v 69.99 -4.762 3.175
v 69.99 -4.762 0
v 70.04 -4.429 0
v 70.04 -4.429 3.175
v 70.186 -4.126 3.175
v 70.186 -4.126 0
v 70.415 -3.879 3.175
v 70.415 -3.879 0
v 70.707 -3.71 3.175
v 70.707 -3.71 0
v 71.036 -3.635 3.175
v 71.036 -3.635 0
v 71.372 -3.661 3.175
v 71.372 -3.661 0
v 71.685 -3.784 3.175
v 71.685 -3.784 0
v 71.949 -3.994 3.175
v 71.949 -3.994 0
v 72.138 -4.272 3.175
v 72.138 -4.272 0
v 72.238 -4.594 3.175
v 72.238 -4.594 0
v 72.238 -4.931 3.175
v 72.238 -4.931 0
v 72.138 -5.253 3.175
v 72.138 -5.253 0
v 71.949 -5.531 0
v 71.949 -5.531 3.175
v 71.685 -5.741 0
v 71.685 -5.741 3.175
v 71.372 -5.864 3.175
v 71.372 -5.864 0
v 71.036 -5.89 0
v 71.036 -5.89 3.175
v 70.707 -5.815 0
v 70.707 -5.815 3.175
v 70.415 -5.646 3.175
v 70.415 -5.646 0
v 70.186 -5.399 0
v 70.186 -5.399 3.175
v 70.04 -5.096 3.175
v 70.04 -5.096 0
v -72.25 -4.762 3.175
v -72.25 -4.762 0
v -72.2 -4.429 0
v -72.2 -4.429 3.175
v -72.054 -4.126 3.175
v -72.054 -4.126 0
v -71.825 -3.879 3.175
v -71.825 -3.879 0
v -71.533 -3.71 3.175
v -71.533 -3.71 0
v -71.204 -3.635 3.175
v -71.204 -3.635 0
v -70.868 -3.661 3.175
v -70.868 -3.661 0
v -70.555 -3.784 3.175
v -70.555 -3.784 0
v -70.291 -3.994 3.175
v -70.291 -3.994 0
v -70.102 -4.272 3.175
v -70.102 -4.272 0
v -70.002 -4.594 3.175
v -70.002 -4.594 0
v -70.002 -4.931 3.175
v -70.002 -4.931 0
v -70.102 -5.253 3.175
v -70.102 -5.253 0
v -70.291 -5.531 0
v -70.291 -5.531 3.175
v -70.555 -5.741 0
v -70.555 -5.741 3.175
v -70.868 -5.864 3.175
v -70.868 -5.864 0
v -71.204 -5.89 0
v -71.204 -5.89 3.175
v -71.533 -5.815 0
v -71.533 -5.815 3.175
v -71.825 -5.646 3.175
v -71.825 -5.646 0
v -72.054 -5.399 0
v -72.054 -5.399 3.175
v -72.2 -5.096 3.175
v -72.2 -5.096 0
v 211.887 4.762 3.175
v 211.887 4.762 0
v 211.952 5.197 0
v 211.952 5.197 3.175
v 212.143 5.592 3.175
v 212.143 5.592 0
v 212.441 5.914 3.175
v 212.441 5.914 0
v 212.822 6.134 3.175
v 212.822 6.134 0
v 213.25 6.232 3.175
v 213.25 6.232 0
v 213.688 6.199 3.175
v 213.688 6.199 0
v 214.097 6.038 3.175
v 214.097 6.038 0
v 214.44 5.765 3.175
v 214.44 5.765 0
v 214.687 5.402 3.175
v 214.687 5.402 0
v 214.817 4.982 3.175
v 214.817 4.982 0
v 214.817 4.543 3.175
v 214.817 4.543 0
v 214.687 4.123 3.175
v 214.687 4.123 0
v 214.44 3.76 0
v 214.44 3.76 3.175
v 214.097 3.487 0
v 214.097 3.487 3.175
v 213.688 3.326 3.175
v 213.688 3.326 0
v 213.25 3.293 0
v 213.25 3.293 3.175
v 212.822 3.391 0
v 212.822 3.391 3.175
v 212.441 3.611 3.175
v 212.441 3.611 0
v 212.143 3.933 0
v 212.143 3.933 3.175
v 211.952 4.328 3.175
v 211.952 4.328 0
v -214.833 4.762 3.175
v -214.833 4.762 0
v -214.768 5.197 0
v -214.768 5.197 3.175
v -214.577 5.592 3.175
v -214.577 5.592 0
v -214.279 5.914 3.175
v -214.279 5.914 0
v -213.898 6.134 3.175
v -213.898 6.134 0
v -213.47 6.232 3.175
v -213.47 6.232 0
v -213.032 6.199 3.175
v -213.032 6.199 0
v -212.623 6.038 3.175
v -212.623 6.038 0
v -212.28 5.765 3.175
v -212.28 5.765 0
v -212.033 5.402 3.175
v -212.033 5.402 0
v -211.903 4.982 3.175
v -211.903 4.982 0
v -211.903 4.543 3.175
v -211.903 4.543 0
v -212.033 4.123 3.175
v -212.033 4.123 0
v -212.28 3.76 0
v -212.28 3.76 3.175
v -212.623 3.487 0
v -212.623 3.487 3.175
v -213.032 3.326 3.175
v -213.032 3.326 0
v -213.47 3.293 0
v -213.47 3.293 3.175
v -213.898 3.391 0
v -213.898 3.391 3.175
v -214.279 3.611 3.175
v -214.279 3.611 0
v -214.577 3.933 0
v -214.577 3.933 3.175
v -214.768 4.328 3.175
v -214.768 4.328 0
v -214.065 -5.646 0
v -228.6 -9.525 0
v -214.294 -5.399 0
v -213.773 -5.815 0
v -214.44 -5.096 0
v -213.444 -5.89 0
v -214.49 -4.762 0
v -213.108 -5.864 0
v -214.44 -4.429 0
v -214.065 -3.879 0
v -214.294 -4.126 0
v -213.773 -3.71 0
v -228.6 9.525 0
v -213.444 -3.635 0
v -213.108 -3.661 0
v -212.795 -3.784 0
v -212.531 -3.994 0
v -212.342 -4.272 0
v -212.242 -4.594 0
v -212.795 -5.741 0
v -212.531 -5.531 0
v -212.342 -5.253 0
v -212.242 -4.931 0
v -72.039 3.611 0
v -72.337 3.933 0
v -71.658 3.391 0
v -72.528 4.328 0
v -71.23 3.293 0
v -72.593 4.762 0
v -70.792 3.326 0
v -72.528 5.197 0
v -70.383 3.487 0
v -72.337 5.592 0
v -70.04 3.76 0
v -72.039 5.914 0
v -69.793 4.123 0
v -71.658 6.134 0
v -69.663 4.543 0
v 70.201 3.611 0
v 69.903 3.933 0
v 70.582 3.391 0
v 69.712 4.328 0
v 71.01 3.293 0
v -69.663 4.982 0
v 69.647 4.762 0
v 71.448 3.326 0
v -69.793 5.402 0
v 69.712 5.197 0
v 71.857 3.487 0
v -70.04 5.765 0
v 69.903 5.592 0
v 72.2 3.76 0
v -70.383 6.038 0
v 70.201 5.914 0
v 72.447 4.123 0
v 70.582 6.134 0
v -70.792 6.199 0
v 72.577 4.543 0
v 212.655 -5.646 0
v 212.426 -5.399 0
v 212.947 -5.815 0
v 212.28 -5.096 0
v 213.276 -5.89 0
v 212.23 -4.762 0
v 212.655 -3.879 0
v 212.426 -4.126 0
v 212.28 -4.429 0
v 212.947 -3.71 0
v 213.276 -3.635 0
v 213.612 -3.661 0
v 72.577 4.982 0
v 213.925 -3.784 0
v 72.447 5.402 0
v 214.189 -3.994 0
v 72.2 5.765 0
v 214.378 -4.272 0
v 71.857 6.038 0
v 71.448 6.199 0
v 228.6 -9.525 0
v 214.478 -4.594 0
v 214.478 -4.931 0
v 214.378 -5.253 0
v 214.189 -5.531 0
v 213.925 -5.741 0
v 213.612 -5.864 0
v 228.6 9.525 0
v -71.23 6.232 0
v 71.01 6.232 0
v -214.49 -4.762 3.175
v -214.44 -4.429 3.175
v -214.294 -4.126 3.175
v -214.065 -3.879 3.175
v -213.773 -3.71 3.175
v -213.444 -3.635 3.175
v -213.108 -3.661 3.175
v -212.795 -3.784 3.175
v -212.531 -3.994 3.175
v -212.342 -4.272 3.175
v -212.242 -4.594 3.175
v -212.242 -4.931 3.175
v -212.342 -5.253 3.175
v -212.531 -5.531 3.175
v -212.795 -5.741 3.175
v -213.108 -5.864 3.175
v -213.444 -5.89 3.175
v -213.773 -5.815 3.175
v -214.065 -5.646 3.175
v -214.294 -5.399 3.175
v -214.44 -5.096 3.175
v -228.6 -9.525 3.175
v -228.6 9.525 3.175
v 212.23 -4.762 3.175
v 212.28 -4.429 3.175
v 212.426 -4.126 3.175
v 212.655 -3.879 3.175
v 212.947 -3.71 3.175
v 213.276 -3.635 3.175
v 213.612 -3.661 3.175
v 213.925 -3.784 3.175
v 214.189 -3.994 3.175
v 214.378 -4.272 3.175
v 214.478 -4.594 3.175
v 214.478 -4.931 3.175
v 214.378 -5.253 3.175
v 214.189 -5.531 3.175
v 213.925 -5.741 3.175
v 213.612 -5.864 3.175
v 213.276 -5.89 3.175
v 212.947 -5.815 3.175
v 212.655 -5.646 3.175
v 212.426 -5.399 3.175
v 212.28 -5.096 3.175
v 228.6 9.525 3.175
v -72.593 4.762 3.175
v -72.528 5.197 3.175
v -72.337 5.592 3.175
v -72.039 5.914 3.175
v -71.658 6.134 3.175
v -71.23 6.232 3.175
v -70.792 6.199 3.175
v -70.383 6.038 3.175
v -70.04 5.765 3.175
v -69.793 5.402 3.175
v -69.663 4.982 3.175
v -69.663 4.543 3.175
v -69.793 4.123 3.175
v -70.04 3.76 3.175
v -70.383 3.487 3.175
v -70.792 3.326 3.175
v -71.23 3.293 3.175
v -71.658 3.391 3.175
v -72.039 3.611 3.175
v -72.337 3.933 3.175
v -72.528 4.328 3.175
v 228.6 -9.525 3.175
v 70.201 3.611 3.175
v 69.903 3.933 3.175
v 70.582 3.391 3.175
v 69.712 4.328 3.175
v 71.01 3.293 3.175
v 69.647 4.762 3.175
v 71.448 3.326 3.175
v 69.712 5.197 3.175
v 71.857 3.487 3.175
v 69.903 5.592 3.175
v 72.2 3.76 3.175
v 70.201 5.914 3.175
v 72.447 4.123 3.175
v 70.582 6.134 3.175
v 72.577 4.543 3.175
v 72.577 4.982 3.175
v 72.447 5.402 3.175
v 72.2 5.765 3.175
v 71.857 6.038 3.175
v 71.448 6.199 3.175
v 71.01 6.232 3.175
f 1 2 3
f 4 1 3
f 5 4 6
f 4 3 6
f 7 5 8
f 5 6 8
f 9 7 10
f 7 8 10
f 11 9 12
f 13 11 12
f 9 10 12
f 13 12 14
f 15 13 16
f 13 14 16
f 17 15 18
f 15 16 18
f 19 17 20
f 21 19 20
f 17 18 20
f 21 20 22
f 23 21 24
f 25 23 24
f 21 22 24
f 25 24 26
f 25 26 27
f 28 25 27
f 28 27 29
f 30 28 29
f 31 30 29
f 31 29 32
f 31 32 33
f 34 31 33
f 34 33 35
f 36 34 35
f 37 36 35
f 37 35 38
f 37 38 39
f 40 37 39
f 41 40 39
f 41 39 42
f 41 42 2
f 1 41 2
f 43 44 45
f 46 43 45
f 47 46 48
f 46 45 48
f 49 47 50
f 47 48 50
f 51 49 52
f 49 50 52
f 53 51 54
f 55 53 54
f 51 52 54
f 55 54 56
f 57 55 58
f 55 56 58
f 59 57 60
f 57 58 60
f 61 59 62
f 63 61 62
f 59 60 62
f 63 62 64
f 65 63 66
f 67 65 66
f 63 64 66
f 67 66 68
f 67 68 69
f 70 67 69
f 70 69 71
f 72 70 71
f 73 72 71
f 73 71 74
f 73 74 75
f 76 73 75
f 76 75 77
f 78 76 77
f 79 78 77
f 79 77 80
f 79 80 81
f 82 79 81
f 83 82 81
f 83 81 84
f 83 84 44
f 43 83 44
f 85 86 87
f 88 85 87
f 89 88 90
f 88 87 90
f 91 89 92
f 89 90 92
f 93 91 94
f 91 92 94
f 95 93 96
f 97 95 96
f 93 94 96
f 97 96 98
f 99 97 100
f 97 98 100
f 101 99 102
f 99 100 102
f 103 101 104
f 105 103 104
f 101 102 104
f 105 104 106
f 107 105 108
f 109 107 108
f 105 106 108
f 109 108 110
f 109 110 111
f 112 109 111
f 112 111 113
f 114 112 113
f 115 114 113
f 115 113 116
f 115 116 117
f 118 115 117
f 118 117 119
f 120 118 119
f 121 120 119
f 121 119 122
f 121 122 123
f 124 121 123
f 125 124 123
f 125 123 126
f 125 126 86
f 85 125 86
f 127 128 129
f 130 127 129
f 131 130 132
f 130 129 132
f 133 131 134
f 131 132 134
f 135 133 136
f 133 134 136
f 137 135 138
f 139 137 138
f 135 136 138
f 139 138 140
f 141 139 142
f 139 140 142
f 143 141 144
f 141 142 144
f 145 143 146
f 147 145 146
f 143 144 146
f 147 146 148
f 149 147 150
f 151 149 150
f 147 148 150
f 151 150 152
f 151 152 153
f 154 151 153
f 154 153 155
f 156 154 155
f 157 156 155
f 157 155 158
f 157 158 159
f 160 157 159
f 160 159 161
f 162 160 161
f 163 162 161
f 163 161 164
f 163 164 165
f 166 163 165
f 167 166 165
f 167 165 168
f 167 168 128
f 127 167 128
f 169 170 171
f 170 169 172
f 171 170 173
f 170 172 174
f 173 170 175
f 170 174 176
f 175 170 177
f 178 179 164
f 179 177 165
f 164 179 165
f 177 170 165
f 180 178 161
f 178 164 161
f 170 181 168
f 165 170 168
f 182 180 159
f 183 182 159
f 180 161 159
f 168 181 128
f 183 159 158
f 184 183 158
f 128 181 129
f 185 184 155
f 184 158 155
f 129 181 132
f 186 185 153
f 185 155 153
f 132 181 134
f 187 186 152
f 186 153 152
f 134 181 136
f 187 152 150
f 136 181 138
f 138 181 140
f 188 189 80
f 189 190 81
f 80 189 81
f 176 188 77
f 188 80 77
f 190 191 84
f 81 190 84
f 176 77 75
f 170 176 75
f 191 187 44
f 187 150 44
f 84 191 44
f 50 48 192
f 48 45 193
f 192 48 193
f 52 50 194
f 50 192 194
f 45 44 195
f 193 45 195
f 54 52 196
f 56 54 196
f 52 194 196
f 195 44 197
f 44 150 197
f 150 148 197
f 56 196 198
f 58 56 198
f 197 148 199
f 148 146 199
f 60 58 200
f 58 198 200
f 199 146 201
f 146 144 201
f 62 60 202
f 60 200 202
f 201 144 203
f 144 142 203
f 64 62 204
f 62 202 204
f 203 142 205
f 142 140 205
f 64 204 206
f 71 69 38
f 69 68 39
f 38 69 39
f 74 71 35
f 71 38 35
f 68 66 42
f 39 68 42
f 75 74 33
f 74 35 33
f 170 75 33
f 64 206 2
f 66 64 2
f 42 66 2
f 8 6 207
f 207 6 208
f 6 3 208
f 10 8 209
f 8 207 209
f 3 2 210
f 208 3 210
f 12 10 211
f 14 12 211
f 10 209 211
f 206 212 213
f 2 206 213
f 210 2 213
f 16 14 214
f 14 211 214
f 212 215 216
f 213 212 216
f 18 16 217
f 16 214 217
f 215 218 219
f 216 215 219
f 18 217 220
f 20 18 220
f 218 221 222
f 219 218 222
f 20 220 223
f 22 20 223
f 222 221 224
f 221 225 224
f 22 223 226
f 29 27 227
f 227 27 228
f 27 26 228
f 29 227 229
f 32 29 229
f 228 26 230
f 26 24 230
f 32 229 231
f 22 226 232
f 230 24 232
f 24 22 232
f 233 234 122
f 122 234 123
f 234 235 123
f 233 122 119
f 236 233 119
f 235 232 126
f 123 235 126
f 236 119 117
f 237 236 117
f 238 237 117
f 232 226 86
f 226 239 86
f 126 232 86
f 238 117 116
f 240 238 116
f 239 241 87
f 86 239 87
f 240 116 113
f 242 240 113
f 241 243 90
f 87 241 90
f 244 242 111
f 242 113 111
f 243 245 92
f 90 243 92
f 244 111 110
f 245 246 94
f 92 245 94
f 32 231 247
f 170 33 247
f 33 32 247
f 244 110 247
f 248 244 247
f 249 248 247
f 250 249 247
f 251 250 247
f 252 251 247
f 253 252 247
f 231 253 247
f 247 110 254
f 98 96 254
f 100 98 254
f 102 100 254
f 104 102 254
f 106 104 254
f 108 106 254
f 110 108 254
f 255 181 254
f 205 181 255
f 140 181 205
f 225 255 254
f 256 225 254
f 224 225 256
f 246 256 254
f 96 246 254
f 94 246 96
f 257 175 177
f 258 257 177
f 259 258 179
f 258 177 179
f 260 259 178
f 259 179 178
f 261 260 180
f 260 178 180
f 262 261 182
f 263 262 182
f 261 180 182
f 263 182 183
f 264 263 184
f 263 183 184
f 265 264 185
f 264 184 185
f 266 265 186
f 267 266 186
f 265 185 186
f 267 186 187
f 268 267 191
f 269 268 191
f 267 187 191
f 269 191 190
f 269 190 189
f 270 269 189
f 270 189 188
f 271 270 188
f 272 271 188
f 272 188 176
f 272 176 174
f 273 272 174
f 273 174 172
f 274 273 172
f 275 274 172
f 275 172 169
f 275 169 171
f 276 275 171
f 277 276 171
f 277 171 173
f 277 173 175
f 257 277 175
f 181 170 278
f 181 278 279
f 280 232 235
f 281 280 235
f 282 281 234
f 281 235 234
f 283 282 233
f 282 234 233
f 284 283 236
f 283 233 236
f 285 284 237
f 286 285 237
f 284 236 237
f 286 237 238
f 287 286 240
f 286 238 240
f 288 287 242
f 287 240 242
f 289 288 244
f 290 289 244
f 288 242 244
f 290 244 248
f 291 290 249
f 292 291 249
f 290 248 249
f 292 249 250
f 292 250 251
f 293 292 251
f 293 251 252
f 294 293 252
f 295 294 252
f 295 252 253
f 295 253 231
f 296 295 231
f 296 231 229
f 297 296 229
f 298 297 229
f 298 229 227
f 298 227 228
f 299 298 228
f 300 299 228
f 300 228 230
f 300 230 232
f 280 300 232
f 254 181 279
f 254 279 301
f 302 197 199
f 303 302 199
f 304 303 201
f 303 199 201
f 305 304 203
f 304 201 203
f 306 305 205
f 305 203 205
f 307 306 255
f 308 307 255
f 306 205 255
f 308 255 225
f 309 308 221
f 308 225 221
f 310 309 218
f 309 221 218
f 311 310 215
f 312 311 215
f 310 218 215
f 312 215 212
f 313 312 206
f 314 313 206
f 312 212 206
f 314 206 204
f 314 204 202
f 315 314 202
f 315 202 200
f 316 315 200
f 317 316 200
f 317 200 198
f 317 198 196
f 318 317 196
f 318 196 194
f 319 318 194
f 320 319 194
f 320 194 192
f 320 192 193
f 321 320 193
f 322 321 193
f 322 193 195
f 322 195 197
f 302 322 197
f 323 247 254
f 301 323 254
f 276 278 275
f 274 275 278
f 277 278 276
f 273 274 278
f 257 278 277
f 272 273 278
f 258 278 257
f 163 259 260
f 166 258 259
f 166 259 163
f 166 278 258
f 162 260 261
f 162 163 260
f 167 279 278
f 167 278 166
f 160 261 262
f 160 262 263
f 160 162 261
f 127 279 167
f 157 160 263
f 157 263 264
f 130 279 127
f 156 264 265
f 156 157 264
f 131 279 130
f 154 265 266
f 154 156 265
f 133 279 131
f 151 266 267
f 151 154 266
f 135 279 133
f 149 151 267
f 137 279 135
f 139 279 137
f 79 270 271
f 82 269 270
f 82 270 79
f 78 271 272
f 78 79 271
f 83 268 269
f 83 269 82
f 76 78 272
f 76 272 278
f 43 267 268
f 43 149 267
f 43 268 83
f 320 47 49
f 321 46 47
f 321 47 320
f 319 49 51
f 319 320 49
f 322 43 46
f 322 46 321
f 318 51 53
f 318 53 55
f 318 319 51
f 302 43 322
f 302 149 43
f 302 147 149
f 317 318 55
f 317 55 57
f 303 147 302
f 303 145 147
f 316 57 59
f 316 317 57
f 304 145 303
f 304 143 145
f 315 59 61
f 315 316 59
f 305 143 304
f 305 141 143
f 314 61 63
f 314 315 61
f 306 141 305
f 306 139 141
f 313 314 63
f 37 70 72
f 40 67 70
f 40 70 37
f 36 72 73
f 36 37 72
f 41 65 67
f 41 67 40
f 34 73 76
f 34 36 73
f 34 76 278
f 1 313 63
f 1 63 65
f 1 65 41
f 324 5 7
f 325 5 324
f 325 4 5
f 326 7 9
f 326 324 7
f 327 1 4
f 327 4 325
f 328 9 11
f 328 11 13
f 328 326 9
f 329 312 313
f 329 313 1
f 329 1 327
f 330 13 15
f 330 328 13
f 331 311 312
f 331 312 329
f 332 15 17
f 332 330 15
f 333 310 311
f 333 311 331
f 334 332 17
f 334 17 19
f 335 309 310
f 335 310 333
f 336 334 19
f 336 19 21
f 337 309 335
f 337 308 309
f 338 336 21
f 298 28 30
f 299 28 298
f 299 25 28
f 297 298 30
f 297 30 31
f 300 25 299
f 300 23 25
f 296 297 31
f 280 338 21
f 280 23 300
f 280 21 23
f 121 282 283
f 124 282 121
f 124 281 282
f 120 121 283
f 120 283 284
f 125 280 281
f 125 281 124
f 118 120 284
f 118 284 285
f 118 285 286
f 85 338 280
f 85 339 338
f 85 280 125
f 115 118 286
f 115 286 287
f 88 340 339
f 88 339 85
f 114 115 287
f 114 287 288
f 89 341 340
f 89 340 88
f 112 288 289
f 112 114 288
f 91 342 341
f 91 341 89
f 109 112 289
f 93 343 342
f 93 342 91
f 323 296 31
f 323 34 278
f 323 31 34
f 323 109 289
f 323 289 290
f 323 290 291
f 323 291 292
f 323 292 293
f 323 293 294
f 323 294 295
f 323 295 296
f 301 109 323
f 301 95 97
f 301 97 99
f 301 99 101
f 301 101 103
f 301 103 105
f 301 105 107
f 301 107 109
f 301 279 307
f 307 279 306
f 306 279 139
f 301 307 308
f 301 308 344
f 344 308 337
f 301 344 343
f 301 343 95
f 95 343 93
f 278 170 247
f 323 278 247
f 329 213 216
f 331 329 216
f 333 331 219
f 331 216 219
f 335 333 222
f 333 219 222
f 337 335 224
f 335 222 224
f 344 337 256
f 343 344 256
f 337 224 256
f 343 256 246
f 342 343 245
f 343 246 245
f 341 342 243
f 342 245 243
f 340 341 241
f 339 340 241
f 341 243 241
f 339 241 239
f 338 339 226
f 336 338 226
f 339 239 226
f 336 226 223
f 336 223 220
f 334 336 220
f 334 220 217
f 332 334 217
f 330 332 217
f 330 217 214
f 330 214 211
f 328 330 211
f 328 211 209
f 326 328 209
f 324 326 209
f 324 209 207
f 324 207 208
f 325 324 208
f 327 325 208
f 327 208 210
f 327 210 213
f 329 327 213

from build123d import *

# Parameters (mm, degrees)
SKETCH1_W             = 457.2
SKETCH1_H             = 19.05
BOSS_EXTRUDE1_DEPTH   = 3.175
F_4_CLEARANCE_HOLE1_D = 2.9464
F_4_40_TAPPED_HOLE1_D = 2.2606


with BuildPart() as part:
    # Sketch1 → Boss-Extrude1 (new body)
    with BuildSketch(Plane.XY):
        Rectangle(SKETCH1_W, SKETCH1_H)
    extrude(amount=BOSS_EXTRUDE1_DEPTH)

    # #4 Clearance Hole1 (through all)
    with Locations(Plane.XY.offset(3.175)):
        with Locations((-213.36, 4.7625), (-71.12, 4.7625), (71.12, 4.7625), (213.36, 4.7625)):
            Hole(F_4_CLEARANCE_HOLE1_D / 2)

    # #4-40 Tapped Hole1 (through all)
    with Locations(Plane.XY.offset(3.175)):
        with Locations((-213.36, -4.7625), (-71.12, -4.7625), (71.12, -4.7625), (213.36, -4.7625)):
            Hole(F_4_40_TAPPED_HOLE1_D / 2)


solid = part.part
